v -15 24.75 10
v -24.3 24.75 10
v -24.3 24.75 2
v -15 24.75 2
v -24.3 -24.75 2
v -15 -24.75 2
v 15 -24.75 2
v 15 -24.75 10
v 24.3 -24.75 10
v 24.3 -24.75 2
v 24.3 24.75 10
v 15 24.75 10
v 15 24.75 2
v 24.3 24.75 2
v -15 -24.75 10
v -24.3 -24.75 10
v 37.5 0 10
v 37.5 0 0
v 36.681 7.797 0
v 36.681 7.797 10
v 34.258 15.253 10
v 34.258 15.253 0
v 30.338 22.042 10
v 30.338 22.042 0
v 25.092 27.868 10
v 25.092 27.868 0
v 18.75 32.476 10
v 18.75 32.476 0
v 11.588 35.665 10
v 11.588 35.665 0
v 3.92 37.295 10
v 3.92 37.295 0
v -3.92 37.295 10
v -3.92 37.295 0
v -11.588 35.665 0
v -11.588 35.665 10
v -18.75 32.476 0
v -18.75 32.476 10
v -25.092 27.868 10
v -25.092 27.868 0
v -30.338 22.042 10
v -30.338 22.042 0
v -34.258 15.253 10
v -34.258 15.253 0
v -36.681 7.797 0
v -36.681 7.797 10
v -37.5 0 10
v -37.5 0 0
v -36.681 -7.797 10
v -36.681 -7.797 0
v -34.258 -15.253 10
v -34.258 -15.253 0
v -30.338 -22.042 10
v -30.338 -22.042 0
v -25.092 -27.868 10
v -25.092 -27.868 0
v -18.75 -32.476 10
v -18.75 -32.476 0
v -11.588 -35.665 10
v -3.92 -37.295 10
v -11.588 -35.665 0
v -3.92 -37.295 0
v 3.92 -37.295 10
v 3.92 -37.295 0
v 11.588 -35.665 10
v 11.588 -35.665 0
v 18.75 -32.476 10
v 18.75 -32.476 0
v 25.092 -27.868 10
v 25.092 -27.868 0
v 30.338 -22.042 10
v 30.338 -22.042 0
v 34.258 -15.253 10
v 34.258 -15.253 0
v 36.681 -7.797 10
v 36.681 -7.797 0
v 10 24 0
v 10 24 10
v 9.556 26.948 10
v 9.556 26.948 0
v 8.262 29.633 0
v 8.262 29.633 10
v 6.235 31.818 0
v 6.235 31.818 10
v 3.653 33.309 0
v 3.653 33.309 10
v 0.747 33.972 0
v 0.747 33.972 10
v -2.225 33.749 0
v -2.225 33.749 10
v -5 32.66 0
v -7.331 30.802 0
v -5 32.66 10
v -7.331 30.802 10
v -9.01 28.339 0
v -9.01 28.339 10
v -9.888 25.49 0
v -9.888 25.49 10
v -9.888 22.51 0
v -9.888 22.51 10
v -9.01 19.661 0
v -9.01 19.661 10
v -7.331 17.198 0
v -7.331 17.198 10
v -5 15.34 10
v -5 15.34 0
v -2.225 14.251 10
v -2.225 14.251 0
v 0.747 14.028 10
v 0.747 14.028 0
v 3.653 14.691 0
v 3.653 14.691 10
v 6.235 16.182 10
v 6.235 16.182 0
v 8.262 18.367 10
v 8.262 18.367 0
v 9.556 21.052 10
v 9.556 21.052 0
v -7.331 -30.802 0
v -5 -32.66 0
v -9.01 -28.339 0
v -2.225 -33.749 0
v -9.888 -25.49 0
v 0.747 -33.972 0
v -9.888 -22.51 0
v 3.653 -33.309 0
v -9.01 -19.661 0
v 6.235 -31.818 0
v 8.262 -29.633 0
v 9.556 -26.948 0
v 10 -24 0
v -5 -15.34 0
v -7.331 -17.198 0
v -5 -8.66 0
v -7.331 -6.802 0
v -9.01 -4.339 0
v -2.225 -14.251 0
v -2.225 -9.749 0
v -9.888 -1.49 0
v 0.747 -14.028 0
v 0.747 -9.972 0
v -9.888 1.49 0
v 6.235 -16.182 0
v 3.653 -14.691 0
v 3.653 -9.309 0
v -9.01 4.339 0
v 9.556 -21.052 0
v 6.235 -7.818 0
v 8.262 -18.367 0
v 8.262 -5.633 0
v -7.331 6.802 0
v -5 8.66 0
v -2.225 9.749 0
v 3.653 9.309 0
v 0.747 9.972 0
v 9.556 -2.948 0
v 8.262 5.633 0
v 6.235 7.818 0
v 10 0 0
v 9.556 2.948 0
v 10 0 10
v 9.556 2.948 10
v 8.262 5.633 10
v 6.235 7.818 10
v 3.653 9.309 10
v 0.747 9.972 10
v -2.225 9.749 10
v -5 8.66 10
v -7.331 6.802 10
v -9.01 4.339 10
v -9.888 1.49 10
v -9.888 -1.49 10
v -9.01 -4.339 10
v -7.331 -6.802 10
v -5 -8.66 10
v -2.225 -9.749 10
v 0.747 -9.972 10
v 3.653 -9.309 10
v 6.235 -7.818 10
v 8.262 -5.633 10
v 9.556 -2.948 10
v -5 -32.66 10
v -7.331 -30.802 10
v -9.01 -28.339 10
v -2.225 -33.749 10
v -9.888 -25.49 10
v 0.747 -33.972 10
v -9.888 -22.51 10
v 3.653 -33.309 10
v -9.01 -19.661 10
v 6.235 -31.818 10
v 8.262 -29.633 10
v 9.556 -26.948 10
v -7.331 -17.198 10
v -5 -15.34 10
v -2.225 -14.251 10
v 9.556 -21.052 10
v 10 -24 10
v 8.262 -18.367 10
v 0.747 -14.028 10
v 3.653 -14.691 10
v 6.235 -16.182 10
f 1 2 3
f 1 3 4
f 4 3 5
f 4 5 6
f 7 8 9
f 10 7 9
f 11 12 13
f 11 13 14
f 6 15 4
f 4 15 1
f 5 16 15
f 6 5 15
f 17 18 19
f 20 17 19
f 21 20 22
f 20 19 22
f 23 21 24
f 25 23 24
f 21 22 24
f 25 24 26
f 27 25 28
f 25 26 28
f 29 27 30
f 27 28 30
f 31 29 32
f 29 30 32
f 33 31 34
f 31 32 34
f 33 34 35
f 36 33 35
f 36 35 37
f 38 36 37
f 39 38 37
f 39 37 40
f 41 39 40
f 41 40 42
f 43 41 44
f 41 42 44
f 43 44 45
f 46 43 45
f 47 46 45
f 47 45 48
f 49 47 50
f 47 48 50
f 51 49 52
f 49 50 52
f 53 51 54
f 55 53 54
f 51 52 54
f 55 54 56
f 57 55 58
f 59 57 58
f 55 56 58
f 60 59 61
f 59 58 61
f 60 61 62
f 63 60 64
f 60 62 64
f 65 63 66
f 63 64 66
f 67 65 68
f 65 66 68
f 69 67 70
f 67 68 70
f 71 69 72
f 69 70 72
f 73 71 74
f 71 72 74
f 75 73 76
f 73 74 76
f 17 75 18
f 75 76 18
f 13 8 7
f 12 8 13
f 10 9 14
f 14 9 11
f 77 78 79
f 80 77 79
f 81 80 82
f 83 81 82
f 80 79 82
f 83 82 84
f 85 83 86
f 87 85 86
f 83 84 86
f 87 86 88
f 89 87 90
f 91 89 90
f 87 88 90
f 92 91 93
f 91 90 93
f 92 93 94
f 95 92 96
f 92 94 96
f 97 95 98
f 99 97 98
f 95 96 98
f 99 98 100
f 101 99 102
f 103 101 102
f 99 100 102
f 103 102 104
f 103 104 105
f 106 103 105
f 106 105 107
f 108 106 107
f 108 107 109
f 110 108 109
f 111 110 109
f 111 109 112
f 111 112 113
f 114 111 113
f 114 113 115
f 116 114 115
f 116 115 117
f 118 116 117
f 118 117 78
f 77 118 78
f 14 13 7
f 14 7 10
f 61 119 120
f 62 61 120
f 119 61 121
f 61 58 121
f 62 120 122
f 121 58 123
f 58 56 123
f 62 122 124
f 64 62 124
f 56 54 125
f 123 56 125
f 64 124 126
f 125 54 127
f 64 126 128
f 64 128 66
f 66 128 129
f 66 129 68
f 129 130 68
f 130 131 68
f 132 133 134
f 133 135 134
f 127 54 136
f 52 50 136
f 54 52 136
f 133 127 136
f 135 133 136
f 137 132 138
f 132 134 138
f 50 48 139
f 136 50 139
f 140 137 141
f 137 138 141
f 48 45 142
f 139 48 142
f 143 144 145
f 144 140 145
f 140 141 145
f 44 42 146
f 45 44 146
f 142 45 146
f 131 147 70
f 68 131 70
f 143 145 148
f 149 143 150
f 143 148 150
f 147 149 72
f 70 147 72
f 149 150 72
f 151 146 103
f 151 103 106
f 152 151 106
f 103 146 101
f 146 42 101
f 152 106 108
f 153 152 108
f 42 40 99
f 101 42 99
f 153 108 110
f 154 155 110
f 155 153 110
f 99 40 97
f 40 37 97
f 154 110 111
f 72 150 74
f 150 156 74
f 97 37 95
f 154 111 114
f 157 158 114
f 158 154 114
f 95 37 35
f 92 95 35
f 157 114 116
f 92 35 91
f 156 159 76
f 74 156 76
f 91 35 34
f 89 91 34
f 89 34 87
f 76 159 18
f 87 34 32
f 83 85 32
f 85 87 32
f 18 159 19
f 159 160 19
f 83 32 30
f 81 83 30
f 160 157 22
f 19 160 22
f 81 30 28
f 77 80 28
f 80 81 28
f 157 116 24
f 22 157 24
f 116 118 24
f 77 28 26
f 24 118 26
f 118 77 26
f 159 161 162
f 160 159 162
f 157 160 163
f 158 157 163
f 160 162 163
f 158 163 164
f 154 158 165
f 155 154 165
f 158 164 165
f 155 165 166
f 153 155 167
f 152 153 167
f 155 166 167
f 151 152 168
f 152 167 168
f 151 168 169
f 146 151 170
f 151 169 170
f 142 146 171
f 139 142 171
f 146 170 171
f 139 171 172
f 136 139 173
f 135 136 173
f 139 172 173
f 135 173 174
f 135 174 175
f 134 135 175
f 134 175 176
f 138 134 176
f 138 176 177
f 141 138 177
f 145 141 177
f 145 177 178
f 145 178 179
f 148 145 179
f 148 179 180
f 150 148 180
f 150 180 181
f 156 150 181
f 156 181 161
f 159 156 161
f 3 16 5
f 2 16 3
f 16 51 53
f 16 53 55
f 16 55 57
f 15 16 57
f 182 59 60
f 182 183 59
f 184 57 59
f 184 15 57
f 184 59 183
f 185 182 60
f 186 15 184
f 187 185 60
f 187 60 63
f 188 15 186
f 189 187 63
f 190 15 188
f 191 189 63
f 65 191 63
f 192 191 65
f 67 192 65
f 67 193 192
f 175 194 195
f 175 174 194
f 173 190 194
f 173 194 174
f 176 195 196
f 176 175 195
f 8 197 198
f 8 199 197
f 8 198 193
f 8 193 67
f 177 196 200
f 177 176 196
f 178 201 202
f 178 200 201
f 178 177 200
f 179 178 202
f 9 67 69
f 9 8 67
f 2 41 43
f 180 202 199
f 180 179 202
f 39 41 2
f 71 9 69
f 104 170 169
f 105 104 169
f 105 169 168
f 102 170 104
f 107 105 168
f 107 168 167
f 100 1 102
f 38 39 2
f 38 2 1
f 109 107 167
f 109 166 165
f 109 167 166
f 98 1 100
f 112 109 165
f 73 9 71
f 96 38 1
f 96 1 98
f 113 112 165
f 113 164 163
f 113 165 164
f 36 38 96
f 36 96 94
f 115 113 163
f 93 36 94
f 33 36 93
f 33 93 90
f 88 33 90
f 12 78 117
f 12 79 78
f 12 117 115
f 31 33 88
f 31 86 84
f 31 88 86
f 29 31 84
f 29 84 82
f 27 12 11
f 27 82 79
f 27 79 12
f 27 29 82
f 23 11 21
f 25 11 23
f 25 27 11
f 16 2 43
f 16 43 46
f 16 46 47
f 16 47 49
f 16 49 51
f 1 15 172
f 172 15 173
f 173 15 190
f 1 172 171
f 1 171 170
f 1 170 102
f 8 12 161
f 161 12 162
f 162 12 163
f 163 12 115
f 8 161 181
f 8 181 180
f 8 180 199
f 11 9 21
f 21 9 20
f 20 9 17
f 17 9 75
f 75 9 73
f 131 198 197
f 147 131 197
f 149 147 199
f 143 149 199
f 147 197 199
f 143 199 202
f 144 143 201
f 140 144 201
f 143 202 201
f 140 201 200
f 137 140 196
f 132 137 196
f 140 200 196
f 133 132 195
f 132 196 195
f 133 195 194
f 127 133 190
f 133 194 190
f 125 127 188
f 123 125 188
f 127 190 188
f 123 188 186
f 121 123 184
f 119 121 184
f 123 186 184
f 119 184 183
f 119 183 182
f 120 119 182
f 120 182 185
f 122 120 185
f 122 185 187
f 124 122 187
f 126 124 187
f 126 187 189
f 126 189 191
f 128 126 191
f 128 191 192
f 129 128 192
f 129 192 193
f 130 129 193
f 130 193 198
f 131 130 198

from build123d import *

# Parameters (mm, degrees)
F0_R     = 37.5
F1_DEPTH = 10
F2_W     = 9.3
F2_H     = 49.5
F3_DEPTH = 8
F2_R     = 10
F4_DEPTH = 10.001


with BuildPart() as f1:
    # F0 (on Top) → F1 (new body)
    with BuildSketch(Plane.XY):
        Circle(F0_R)
    extrude(amount=F1_DEPTH)

    # F2 (on face) → F3 (cut)
    with BuildSketch(Plane.XY.offset(10)):
        with Locations((-19.65, 0)):
            Rectangle(F2_W, F2_H)
        with Locations((19.65, 0)):
            Rectangle(F2_W, F2_H)
    extrude(amount=-F3_DEPTH, mode=Mode.SUBTRACT)

    # F2 (on face) → F4 (cut, through all)
    with BuildSketch(Plane.XY.offset(10)):
        with Locations((0, 24)):
            Circle(F2_R)
        Circle(F2_R)
        with Locations((0, -24)):
            Circle(F2_R)
    extrude(amount=-F4_DEPTH, mode=Mode.SUBTRACT)


solid = f1.part
